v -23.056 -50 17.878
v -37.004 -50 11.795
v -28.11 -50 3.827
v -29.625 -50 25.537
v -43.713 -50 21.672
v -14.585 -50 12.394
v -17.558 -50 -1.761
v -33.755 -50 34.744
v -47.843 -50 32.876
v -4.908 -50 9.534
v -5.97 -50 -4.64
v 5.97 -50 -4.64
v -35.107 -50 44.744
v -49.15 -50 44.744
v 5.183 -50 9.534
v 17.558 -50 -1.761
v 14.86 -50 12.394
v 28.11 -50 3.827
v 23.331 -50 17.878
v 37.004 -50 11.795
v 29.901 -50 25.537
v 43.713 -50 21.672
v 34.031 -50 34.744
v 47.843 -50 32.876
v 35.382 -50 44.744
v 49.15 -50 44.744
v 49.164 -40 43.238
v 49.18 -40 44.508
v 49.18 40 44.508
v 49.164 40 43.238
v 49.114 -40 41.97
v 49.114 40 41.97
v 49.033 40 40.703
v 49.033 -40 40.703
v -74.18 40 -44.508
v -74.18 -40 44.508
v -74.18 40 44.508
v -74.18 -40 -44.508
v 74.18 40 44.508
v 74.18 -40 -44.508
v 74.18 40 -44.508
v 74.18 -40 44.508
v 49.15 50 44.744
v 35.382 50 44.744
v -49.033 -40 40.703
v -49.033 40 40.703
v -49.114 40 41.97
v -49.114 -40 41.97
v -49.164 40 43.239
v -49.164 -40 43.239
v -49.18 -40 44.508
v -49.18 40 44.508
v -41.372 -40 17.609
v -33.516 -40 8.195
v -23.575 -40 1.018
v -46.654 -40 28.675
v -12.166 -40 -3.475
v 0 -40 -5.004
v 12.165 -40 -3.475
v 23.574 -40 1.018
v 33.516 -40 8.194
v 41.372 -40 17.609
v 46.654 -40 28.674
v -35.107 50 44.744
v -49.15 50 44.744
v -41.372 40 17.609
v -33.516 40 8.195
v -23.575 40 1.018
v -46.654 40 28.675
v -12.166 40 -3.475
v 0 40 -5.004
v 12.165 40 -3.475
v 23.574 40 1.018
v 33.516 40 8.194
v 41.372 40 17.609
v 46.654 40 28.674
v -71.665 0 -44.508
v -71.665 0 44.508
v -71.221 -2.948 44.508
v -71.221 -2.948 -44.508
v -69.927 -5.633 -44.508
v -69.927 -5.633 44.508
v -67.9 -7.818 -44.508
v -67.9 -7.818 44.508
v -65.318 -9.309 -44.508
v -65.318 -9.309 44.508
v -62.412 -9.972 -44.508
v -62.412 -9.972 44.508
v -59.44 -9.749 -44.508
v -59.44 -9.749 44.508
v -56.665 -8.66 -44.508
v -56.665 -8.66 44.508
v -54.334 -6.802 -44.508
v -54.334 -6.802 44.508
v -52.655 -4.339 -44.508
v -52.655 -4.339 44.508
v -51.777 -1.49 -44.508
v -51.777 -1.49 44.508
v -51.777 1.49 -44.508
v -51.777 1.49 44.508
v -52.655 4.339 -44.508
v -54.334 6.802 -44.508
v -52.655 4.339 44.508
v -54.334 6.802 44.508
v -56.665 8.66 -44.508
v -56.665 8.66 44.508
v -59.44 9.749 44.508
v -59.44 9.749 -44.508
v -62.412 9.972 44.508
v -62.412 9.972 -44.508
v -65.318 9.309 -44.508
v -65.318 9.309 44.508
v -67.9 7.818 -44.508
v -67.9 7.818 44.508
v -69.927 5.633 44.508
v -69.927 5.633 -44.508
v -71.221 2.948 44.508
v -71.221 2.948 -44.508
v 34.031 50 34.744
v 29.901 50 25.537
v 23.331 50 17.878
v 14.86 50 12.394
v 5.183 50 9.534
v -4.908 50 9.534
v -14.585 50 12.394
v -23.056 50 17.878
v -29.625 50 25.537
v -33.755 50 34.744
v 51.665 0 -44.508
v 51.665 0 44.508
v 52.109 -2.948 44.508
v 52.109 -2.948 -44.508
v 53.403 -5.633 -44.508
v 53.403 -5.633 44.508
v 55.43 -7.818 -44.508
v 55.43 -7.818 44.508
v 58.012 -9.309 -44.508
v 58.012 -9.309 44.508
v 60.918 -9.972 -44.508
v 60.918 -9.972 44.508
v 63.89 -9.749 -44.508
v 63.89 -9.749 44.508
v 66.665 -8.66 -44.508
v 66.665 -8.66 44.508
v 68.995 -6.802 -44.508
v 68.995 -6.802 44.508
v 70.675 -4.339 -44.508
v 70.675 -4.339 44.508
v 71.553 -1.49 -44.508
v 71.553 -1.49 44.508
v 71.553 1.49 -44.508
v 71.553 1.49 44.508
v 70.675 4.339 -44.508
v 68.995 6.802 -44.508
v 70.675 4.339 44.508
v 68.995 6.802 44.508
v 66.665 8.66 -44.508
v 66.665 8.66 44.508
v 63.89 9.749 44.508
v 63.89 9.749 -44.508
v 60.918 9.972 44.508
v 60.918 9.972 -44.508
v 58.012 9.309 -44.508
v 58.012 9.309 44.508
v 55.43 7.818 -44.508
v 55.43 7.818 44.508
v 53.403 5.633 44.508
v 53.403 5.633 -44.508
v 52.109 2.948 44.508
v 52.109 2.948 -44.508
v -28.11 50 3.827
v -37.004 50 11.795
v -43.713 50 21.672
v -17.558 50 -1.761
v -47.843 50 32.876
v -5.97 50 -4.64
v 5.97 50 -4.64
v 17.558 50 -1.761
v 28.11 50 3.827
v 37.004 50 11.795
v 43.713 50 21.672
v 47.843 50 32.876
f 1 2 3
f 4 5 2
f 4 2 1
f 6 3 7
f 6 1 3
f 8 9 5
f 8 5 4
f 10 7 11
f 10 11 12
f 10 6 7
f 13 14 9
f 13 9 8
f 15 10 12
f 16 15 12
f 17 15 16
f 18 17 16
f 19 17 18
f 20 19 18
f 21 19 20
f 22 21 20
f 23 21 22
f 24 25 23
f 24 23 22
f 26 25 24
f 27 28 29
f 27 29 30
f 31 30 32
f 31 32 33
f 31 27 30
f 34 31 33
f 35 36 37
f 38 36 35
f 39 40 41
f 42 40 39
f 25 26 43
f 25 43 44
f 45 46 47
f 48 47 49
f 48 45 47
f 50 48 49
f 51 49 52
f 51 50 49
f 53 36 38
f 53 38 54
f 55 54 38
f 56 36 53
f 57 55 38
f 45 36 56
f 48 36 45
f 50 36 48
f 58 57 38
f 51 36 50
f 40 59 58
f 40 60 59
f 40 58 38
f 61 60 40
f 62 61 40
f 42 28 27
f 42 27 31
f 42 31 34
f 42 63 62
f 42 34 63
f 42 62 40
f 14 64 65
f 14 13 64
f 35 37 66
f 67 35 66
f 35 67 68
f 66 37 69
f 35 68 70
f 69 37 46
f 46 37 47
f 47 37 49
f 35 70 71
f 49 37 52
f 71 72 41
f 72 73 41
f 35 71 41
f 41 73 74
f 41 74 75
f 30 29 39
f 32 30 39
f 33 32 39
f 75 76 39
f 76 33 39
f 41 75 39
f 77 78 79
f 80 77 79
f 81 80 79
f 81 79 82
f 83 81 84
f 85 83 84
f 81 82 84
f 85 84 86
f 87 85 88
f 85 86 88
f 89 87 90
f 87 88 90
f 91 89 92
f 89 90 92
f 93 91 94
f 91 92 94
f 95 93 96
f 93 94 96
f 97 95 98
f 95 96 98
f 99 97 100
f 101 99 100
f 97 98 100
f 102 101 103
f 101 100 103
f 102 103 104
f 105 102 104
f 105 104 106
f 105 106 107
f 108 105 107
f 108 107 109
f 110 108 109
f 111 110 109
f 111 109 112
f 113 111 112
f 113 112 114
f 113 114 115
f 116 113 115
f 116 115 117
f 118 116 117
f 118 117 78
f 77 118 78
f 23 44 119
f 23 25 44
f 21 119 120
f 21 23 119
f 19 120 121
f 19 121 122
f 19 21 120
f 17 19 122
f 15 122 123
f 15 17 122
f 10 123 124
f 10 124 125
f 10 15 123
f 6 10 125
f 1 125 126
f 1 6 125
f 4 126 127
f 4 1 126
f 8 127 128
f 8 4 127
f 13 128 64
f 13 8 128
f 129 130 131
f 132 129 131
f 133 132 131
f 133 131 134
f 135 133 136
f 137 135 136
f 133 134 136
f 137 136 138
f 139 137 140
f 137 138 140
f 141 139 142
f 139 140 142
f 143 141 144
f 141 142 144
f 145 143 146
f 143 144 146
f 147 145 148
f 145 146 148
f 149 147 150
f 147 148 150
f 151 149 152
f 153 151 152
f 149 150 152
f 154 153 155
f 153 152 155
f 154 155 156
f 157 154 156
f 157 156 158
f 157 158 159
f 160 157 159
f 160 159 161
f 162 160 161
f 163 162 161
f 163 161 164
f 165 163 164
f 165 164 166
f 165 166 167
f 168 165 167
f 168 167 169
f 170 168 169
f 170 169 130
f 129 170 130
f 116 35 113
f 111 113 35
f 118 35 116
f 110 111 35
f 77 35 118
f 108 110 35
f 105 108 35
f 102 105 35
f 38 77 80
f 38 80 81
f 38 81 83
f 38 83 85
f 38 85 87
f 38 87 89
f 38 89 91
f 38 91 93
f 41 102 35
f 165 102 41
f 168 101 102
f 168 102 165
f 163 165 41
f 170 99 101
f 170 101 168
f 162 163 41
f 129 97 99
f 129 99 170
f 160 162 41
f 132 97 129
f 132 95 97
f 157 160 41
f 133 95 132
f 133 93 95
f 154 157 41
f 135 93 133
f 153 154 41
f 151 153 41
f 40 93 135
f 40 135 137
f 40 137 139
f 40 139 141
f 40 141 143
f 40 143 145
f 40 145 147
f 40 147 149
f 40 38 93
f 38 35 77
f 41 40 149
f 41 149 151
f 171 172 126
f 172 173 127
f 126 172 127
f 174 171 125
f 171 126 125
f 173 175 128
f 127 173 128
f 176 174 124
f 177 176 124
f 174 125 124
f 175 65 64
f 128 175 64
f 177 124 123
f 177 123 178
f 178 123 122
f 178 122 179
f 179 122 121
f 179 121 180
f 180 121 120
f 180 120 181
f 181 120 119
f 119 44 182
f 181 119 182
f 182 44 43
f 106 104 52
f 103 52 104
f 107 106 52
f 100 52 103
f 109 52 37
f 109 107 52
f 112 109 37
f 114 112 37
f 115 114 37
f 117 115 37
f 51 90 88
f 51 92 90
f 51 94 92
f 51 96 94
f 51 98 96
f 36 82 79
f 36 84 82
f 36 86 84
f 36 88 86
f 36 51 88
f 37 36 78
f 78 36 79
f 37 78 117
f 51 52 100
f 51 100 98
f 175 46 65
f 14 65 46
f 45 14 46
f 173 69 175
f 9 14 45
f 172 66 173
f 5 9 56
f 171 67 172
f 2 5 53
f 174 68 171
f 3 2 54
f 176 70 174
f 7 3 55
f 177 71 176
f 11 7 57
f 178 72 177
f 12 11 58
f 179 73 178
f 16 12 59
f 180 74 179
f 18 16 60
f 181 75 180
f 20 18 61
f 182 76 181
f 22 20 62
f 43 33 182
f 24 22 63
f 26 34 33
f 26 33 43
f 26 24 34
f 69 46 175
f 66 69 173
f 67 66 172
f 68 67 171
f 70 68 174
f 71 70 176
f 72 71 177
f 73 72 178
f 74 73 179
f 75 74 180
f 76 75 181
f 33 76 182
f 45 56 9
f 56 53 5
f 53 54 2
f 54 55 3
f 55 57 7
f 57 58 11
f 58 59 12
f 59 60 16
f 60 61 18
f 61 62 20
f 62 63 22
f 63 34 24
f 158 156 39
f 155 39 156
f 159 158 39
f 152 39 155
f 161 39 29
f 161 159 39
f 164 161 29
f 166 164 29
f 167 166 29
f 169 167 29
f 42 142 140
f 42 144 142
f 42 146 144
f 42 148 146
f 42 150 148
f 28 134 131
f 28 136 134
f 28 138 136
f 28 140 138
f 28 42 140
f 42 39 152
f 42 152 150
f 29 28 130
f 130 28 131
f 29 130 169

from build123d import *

# Parameters (mm, degrees)
F2_DEPTH = 40
F3_DEPTH = 50
F5_D     = 20


with BuildPart() as f2:
    # F0 (on Front) → F2 (new body, symmetric)
    with BuildSketch(Plane.XZ):
        with BuildLine():
            Line((-74.1799686244, 44.5079811746), (-74.1799686244, -44.5079811746))
            Line((-74.1799686244, -44.5079811746), (74.1799686244, -44.5079811746))
            Line((74.1799686244, -44.5079811746), (74.1799686244, 44.5079811746))
            Line((74.1799686244, 44.5079811746), (49.1799686244, 44.5079811746))
            ThreePointArc((49.1799686244, 44.5079811746), (0, -4.6719874497), (-49.1799686244, 44.5079811746))
            Line((-49.1799686244, 44.5079811746), (-74.1799686244, 44.5079811746))
        make_face()
    extrude(amount=F2_DEPTH, both=True)

    # F1 (on Front) → F3 (join, symmetric)
    with BuildSketch(Plane.XZ):
        with BuildLine():
            Line((-35.1070836186, 44.7443202138), (-49.149915576, 44.7443202138))
            ThreePointArc((-49.149915576, 44.7443202138), (-1.8626e-06, -5.0042579476), (49.1499118507, 44.7443202138))
            Line((49.1499118507, 44.7443202138), (35.3824310005, 44.7443202138))
            ThreePointArc((35.3824310005, 44.7443202138), (0.1376736909, 9.1714728244), (-35.1070836186, 44.7443202138))
        make_face()
    extrude(amount=F3_DEPTH, both=True)

    # F5 (through all)
    with Locations(Plane(origin=(0, 0, -44.5079811746), x_dir=(1, 0, 0), z_dir=(0, 0, -1))):
        with Locations((-61.6649421002, 0), (61.6649402375, 0)):
            Hole(F5_D / 2)


solid = f2.part
